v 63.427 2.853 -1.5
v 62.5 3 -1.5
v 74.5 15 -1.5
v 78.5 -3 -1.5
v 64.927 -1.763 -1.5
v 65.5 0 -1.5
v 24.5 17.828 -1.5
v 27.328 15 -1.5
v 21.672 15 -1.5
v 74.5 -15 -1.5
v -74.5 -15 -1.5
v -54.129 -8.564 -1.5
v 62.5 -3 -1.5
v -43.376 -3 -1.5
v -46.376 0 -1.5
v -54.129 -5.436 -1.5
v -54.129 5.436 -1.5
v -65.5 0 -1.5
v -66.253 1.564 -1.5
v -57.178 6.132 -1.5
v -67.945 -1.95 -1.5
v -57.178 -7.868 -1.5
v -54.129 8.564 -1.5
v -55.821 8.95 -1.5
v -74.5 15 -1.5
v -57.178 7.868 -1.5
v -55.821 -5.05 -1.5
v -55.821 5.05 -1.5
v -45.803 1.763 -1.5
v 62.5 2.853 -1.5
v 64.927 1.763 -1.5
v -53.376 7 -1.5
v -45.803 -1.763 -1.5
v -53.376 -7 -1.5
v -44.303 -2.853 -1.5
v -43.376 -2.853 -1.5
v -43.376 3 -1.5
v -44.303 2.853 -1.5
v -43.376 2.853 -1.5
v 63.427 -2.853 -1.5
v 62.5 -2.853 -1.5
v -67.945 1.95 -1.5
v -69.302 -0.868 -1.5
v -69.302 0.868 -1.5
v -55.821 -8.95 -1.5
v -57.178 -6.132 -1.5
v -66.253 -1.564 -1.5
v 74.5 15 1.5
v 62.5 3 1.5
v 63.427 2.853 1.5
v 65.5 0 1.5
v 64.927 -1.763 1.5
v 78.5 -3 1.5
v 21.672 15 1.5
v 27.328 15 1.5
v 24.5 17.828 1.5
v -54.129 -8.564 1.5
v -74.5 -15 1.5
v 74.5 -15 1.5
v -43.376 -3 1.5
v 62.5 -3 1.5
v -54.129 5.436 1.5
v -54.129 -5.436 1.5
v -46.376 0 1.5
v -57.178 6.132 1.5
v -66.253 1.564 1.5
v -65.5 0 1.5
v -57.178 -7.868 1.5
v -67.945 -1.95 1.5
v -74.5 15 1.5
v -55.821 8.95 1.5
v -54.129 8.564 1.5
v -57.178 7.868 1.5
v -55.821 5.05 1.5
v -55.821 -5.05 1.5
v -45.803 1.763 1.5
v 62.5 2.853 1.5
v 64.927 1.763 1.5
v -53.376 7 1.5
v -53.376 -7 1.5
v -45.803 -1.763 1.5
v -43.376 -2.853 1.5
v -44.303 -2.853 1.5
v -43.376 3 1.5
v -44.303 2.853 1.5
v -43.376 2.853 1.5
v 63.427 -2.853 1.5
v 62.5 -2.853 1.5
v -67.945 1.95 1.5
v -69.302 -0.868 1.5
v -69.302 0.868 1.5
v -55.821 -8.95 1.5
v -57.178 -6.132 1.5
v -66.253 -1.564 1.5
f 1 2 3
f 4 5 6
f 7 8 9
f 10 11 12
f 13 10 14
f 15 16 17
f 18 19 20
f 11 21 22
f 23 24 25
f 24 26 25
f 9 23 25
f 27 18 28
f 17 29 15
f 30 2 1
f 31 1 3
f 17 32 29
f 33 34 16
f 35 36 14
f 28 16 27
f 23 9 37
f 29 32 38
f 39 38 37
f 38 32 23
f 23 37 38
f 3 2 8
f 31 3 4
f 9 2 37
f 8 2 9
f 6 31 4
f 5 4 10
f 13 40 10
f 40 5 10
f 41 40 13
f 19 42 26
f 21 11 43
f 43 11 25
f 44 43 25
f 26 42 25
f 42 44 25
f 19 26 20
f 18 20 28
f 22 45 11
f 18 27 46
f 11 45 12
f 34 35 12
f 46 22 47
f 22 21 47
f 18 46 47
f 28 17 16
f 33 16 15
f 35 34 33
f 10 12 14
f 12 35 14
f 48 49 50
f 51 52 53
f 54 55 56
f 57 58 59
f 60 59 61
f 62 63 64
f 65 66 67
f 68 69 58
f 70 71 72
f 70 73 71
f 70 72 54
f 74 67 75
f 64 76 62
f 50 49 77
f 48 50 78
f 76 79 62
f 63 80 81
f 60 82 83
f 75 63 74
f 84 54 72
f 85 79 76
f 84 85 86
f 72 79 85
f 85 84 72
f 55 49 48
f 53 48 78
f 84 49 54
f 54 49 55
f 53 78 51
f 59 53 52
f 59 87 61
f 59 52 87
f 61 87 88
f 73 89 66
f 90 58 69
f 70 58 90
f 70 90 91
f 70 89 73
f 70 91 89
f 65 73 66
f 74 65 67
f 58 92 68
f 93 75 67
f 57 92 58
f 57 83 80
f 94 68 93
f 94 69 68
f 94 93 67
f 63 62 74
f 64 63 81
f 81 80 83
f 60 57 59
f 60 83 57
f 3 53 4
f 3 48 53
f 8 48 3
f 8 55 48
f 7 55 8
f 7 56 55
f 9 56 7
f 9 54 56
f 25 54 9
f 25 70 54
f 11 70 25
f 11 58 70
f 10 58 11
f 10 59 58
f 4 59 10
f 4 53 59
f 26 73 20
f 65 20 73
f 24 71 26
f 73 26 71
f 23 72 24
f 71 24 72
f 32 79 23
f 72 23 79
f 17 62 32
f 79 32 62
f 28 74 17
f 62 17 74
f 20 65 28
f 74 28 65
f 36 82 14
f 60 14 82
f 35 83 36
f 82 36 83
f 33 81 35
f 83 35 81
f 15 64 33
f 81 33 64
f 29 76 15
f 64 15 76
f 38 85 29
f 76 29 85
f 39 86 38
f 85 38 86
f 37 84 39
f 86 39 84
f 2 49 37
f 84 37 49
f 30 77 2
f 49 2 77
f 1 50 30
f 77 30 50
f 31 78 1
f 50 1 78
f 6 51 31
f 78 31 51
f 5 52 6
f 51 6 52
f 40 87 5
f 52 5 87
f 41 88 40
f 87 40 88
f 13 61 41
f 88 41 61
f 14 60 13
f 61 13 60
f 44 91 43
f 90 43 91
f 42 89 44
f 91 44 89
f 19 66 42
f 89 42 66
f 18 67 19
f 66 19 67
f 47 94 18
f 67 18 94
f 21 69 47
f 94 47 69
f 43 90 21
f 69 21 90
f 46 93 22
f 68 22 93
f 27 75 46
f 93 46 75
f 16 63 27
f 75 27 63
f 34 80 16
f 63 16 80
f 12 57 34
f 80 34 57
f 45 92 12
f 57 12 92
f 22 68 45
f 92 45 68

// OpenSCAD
// file: ../../shapes/bends.scad
$fn = 360;

module sheet_bend_example(length, angle, radius, width, thickness) {
    translate(v = [(length[1] / 2) - thickness,-width / 2,max(length[0], length[2])])
    rotate(a = -90, v = [1,0,0])  bends(length, angle, radius, width, thickness);
}

module bends(length, angle, radius, width, thickness, i=0) {
    if (i < len(length)) {
        offset = i==0 ? 2*thickness*sin(angle[i]) : 2*thickness*sin(angle[i])+2*thickness*sin(angle[i-1]);
        cube([thickness, length[i]-offset, width]);
        translate([-radius, length[i]-offset]) {
            rotate_extrude(angle = angle[i]) translate([radius,0,0]) square([thickness,width]);
            rotate([0,0,angle[i]]) translate([radius,0,0]) bends(length, angle, radius, width, thickness, i+1);
        }
    }
}

t = 1;
r = t;

w = 10;
l = [10, 20 + (t * 2), 10];
a = [90, 90, 0];

sheet_bend_example(l, a, r, w, t);
// file: rear_standard_carrier_base.scad
include <../../constants.scad>
use <rear_standard_carrier_screw_holes.scad>
use <../../shapes/bends.scad>

// rear_standard_carrier_base_flat();
module rear_standard_carrier_base(folded = true) {
    if (folded) {
        carrier_base();
    } else {
        carrier_base_flat();
    }
}

module carrier_base(folded = true) {
    thickness = rear_standard_carrier_thickness;
    radius = thickness;

    width = rear_standard_carrier_width;
    length = [rear_standard_carrier_base_ear_length, rear_standard_carrier_base_length + (thickness * 2), rear_standard_carrier_base_ear_length];
    angle = [90, 90, 0];
    union() {
        difference() {
            translate(v = [(length[1] / 2) - thickness,-width / 2,max(length[0], length[2])]) {
                rotate(a = -90, v = [1,0,0])  bends(length, angle, radius, width, thickness);
            }

            // slot
            translate(v = [0,0,-1]) linear_extrude(height = thickness + 2) square([rear_standard_carrier_base_slot_length, rear_standard_carrier_base_slot_width], center = true);

            // screw holes
            triangle_offset = rear_standard_carrier_base_ear_length - (rear_standard_carrier_screw_hole_triangle_height / 2) - rear_standard_carrier_screw_hole_triangle_top_margin;
            translate(v = [rear_standard_carrier_base_length / 2 + thickness + 1,0,triangle_offset]) rotate(a = -90, v = [0,1,0]) linear_extrude(height = thickness + 2) rear_standard_carrier_screw_holes();
            mirror(v = [1,0,0]) translate(v = [rear_standard_carrier_base_length / 2 + thickness + 1,0,triangle_offset]) rotate(a = -90, v = [0,1,0]) linear_extrude(height = thickness + 2) rear_standard_carrier_screw_holes();
        }

        // Zero marker
        zero_marker_offset = rear_standard_carrier_width / 2;
        translate(v = [0,zero_marker_offset,0]) {    
            rotate(a = 45, v = [0,0,1]) {
                linear_extrude(height = rear_standard_carrier_thickness) square(size = [zero_marker_side_length,zero_marker_side_length], center = true);
            }
        }
    }
}

module carrier_base_flat(ARGS) {

}

rear_standard_carrier_base(folded = true);
// file: rear_standard_carrier_screw_holes.scad
include <../../constants.scad>

module rear_standard_carrier_screw_holes() {
    side_length = rear_standard_carrier_screw_hole_triangle_side_length;
    height = rear_standard_carrier_screw_hole_triangle_height;
    translate(v = [height / 2,side_length / 2]) {
        circle(d = rear_standard_carrier_screw_hole_diameter);
    }
    translate(v = [height / 2,-side_length / 2]) {
        circle(d = rear_standard_carrier_screw_hole_diameter);
    }
    translate(v = [-height / 2,0]) {
        circle(d = rear_standard_carrier_screw_hole_diameter);
    }
}

rear_standard_carrier_screw_holes();
// file: ../../constants.scad
/********************
* Table of Contents *
* *******************/
// 1. Materials
// 2. Rear Standard
    // 2.1 Rear Standard Carrier
    // 2.2 Rear Standard Housing
    // 2.3 Rear Standard Tilt Plate
    // 2.4 Rear Standard Rise Plate
// 3. Front Standard
// 4. Base
// 5. Ground Glass
// 6. Film Cassette
// 7. Movements



/****************
* 1. Materials  *
* **************/
    sheet_metal_thickness_structural = 3;
    sheet_metal_thickness_nonstructural = 2;
    screw_hole_metric_3 = 3;
    screw_hole_metric_4 = 4;
    screw_hole_metric_5 = 5;
    screw_hole_metric_6 = 6;

/********************
* 2. Rear Standard  *
* *******************/

    // 2.1 Rear Standard Carrier
    rear_standard_carrier_thickness = sheet_metal_thickness_structural;
    rear_standard_carrier_width = 30;
    rear_standard_carrier_base_length = 259.5;
    rear_standard_carrier_base_ear_length = 40;
    rear_standard_carrier_base_slot_length = 160;
    rear_standard_carrier_base_slot_width = 6;
    rear_standard_carrier_upright_length = 149;
    rear_standard_carrier_upright_slot_width = 6;
    rear_standard_carrier_screw_hole_diameter = screw_hole_metric_4;
    rear_standard_carrier_screw_hole_triangle_side_length = (rear_standard_carrier_width / 3) + rear_standard_carrier_screw_hole_diameter;
    rear_standard_carrier_screw_hole_triangle_height = (rear_standard_carrier_screw_hole_triangle_side_length * sqrt(3)) / 2;
    rear_standard_carrier_screw_hole_triangle_top_margin = 5;

    // 2.2 Rear Standard Housing
    rear_standard_housing_width = 245;
    rear_standard_housing_height = 126;
    rear_standard_housing_depth = 30;
    rear_standard_housing_thickness = 10;
    rear_standard_housing_frame_width = 33;
    rear_standard_housing_tilt_slot_additional_width = 2; // screw head diameter + small margin - rear_standard_tilt_slot_width


    // 2.3 Rear Standard Tilt Plate
    rear_standard_tilt_plate_thickness = sheet_metal_thickness_nonstructural;
    rear_standard_tilt_slot_radius = 45;
    rear_standard_tilt_slot_width = 5;
    rear_standard_tilt_slot_range = 50;
    rear_standard_tilt_slot_rotational_offset = 5;

    // 2.4 Rear Standard Rise Plate
    rear_standard_pivot_stud_diameter = 4;

/****************
* 7. Movements  *
* **************/
    zero_marker_side_length = 4;
    rear_standard_rise_zero_pos = rear_standard_carrier_upright_length + rear_standard_carrier_base_ear_length / 2 - rear_standard_housing_height;
    rear_standard_rise = 0;
// main file
include <../../constants.scad>
use <rear_standard_carrier_screw_holes.scad>
use <rear_standard_carrier_base.scad>

module rear_standard_carrier_upright() {
    linear_extrude(height = rear_standard_carrier_thickness, center = true)
    difference() {
        union() {
            square([rear_standard_carrier_upright_length, rear_standard_carrier_width], center = true);

            // Zero marker
            zero_marker_offset_x = 24.5;
            zero_marker_offset_y = rear_standard_carrier_width / 2;
            translate(v = [zero_marker_offset_x,zero_marker_offset_y,0]) {    
                rotate(a = 45, v = [0,0,1]) {
                    square(size = [zero_marker_side_length,zero_marker_side_length], center = true);
                }
            }

            // Top
            polygon(points = [
                [rear_standard_carrier_upright_length / 2, rear_standard_carrier_width / 2], 
                [rear_standard_carrier_upright_length / 2, -rear_standard_carrier_width / 2],
                [rear_standard_carrier_upright_length / 2 + 4, -rear_standard_carrier_upright_slot_width / 2]
            ]);
        }


        // Movement Screw Slot
        slot_top_margin = (rear_standard_carrier_width - rear_standard_carrier_upright_slot_width) / 2;
        slot_bottom_margin = rear_standard_carrier_screw_hole_triangle_height + rear_standard_carrier_screw_hole_diameter + rear_standard_carrier_screw_hole_diameter + rear_standard_carrier_screw_hole_triangle_top_margin + rear_standard_carrier_upright_slot_width;
        slot_length = rear_standard_carrier_upright_length - (slot_top_margin + slot_bottom_margin);
        slot_offset_x = (slot_bottom_margin - slot_top_margin) / 2;
        translate(v = [slot_offset_x,0,0]) {
            union() {
                square([slot_length, rear_standard_carrier_upright_slot_width], center = true);
                translate(v = [slot_length / 2,0,0]) circle(r = rear_standard_carrier_upright_slot_width / 2);
                mirror([1,0,0]) translate(v = [slot_length / 2,0,0]) circle(r = rear_standard_carrier_upright_slot_width / 2);
            }
        }

        // Screw Holes
        screw_hole_offset = -(rear_standard_carrier_upright_length / 2) + (rear_standard_carrier_screw_hole_triangle_height / 2) + (rear_standard_carrier_screw_hole_diameter / 2) + rear_standard_carrier_screw_hole_triangle_top_margin;
        translate(v = [screw_hole_offset,0,0]) {
            rear_standard_carrier_screw_holes();
        } 
    }
}

debug_base_flat_offset = -(rear_standard_carrier_upright_length / 2) + rear_standard_carrier_base_ear_length / 2;
// #translate(v = [debug_base_flat_offset,0,0]) rear_standard_carrier_base_flat();


rear_standard_carrier_upright();
